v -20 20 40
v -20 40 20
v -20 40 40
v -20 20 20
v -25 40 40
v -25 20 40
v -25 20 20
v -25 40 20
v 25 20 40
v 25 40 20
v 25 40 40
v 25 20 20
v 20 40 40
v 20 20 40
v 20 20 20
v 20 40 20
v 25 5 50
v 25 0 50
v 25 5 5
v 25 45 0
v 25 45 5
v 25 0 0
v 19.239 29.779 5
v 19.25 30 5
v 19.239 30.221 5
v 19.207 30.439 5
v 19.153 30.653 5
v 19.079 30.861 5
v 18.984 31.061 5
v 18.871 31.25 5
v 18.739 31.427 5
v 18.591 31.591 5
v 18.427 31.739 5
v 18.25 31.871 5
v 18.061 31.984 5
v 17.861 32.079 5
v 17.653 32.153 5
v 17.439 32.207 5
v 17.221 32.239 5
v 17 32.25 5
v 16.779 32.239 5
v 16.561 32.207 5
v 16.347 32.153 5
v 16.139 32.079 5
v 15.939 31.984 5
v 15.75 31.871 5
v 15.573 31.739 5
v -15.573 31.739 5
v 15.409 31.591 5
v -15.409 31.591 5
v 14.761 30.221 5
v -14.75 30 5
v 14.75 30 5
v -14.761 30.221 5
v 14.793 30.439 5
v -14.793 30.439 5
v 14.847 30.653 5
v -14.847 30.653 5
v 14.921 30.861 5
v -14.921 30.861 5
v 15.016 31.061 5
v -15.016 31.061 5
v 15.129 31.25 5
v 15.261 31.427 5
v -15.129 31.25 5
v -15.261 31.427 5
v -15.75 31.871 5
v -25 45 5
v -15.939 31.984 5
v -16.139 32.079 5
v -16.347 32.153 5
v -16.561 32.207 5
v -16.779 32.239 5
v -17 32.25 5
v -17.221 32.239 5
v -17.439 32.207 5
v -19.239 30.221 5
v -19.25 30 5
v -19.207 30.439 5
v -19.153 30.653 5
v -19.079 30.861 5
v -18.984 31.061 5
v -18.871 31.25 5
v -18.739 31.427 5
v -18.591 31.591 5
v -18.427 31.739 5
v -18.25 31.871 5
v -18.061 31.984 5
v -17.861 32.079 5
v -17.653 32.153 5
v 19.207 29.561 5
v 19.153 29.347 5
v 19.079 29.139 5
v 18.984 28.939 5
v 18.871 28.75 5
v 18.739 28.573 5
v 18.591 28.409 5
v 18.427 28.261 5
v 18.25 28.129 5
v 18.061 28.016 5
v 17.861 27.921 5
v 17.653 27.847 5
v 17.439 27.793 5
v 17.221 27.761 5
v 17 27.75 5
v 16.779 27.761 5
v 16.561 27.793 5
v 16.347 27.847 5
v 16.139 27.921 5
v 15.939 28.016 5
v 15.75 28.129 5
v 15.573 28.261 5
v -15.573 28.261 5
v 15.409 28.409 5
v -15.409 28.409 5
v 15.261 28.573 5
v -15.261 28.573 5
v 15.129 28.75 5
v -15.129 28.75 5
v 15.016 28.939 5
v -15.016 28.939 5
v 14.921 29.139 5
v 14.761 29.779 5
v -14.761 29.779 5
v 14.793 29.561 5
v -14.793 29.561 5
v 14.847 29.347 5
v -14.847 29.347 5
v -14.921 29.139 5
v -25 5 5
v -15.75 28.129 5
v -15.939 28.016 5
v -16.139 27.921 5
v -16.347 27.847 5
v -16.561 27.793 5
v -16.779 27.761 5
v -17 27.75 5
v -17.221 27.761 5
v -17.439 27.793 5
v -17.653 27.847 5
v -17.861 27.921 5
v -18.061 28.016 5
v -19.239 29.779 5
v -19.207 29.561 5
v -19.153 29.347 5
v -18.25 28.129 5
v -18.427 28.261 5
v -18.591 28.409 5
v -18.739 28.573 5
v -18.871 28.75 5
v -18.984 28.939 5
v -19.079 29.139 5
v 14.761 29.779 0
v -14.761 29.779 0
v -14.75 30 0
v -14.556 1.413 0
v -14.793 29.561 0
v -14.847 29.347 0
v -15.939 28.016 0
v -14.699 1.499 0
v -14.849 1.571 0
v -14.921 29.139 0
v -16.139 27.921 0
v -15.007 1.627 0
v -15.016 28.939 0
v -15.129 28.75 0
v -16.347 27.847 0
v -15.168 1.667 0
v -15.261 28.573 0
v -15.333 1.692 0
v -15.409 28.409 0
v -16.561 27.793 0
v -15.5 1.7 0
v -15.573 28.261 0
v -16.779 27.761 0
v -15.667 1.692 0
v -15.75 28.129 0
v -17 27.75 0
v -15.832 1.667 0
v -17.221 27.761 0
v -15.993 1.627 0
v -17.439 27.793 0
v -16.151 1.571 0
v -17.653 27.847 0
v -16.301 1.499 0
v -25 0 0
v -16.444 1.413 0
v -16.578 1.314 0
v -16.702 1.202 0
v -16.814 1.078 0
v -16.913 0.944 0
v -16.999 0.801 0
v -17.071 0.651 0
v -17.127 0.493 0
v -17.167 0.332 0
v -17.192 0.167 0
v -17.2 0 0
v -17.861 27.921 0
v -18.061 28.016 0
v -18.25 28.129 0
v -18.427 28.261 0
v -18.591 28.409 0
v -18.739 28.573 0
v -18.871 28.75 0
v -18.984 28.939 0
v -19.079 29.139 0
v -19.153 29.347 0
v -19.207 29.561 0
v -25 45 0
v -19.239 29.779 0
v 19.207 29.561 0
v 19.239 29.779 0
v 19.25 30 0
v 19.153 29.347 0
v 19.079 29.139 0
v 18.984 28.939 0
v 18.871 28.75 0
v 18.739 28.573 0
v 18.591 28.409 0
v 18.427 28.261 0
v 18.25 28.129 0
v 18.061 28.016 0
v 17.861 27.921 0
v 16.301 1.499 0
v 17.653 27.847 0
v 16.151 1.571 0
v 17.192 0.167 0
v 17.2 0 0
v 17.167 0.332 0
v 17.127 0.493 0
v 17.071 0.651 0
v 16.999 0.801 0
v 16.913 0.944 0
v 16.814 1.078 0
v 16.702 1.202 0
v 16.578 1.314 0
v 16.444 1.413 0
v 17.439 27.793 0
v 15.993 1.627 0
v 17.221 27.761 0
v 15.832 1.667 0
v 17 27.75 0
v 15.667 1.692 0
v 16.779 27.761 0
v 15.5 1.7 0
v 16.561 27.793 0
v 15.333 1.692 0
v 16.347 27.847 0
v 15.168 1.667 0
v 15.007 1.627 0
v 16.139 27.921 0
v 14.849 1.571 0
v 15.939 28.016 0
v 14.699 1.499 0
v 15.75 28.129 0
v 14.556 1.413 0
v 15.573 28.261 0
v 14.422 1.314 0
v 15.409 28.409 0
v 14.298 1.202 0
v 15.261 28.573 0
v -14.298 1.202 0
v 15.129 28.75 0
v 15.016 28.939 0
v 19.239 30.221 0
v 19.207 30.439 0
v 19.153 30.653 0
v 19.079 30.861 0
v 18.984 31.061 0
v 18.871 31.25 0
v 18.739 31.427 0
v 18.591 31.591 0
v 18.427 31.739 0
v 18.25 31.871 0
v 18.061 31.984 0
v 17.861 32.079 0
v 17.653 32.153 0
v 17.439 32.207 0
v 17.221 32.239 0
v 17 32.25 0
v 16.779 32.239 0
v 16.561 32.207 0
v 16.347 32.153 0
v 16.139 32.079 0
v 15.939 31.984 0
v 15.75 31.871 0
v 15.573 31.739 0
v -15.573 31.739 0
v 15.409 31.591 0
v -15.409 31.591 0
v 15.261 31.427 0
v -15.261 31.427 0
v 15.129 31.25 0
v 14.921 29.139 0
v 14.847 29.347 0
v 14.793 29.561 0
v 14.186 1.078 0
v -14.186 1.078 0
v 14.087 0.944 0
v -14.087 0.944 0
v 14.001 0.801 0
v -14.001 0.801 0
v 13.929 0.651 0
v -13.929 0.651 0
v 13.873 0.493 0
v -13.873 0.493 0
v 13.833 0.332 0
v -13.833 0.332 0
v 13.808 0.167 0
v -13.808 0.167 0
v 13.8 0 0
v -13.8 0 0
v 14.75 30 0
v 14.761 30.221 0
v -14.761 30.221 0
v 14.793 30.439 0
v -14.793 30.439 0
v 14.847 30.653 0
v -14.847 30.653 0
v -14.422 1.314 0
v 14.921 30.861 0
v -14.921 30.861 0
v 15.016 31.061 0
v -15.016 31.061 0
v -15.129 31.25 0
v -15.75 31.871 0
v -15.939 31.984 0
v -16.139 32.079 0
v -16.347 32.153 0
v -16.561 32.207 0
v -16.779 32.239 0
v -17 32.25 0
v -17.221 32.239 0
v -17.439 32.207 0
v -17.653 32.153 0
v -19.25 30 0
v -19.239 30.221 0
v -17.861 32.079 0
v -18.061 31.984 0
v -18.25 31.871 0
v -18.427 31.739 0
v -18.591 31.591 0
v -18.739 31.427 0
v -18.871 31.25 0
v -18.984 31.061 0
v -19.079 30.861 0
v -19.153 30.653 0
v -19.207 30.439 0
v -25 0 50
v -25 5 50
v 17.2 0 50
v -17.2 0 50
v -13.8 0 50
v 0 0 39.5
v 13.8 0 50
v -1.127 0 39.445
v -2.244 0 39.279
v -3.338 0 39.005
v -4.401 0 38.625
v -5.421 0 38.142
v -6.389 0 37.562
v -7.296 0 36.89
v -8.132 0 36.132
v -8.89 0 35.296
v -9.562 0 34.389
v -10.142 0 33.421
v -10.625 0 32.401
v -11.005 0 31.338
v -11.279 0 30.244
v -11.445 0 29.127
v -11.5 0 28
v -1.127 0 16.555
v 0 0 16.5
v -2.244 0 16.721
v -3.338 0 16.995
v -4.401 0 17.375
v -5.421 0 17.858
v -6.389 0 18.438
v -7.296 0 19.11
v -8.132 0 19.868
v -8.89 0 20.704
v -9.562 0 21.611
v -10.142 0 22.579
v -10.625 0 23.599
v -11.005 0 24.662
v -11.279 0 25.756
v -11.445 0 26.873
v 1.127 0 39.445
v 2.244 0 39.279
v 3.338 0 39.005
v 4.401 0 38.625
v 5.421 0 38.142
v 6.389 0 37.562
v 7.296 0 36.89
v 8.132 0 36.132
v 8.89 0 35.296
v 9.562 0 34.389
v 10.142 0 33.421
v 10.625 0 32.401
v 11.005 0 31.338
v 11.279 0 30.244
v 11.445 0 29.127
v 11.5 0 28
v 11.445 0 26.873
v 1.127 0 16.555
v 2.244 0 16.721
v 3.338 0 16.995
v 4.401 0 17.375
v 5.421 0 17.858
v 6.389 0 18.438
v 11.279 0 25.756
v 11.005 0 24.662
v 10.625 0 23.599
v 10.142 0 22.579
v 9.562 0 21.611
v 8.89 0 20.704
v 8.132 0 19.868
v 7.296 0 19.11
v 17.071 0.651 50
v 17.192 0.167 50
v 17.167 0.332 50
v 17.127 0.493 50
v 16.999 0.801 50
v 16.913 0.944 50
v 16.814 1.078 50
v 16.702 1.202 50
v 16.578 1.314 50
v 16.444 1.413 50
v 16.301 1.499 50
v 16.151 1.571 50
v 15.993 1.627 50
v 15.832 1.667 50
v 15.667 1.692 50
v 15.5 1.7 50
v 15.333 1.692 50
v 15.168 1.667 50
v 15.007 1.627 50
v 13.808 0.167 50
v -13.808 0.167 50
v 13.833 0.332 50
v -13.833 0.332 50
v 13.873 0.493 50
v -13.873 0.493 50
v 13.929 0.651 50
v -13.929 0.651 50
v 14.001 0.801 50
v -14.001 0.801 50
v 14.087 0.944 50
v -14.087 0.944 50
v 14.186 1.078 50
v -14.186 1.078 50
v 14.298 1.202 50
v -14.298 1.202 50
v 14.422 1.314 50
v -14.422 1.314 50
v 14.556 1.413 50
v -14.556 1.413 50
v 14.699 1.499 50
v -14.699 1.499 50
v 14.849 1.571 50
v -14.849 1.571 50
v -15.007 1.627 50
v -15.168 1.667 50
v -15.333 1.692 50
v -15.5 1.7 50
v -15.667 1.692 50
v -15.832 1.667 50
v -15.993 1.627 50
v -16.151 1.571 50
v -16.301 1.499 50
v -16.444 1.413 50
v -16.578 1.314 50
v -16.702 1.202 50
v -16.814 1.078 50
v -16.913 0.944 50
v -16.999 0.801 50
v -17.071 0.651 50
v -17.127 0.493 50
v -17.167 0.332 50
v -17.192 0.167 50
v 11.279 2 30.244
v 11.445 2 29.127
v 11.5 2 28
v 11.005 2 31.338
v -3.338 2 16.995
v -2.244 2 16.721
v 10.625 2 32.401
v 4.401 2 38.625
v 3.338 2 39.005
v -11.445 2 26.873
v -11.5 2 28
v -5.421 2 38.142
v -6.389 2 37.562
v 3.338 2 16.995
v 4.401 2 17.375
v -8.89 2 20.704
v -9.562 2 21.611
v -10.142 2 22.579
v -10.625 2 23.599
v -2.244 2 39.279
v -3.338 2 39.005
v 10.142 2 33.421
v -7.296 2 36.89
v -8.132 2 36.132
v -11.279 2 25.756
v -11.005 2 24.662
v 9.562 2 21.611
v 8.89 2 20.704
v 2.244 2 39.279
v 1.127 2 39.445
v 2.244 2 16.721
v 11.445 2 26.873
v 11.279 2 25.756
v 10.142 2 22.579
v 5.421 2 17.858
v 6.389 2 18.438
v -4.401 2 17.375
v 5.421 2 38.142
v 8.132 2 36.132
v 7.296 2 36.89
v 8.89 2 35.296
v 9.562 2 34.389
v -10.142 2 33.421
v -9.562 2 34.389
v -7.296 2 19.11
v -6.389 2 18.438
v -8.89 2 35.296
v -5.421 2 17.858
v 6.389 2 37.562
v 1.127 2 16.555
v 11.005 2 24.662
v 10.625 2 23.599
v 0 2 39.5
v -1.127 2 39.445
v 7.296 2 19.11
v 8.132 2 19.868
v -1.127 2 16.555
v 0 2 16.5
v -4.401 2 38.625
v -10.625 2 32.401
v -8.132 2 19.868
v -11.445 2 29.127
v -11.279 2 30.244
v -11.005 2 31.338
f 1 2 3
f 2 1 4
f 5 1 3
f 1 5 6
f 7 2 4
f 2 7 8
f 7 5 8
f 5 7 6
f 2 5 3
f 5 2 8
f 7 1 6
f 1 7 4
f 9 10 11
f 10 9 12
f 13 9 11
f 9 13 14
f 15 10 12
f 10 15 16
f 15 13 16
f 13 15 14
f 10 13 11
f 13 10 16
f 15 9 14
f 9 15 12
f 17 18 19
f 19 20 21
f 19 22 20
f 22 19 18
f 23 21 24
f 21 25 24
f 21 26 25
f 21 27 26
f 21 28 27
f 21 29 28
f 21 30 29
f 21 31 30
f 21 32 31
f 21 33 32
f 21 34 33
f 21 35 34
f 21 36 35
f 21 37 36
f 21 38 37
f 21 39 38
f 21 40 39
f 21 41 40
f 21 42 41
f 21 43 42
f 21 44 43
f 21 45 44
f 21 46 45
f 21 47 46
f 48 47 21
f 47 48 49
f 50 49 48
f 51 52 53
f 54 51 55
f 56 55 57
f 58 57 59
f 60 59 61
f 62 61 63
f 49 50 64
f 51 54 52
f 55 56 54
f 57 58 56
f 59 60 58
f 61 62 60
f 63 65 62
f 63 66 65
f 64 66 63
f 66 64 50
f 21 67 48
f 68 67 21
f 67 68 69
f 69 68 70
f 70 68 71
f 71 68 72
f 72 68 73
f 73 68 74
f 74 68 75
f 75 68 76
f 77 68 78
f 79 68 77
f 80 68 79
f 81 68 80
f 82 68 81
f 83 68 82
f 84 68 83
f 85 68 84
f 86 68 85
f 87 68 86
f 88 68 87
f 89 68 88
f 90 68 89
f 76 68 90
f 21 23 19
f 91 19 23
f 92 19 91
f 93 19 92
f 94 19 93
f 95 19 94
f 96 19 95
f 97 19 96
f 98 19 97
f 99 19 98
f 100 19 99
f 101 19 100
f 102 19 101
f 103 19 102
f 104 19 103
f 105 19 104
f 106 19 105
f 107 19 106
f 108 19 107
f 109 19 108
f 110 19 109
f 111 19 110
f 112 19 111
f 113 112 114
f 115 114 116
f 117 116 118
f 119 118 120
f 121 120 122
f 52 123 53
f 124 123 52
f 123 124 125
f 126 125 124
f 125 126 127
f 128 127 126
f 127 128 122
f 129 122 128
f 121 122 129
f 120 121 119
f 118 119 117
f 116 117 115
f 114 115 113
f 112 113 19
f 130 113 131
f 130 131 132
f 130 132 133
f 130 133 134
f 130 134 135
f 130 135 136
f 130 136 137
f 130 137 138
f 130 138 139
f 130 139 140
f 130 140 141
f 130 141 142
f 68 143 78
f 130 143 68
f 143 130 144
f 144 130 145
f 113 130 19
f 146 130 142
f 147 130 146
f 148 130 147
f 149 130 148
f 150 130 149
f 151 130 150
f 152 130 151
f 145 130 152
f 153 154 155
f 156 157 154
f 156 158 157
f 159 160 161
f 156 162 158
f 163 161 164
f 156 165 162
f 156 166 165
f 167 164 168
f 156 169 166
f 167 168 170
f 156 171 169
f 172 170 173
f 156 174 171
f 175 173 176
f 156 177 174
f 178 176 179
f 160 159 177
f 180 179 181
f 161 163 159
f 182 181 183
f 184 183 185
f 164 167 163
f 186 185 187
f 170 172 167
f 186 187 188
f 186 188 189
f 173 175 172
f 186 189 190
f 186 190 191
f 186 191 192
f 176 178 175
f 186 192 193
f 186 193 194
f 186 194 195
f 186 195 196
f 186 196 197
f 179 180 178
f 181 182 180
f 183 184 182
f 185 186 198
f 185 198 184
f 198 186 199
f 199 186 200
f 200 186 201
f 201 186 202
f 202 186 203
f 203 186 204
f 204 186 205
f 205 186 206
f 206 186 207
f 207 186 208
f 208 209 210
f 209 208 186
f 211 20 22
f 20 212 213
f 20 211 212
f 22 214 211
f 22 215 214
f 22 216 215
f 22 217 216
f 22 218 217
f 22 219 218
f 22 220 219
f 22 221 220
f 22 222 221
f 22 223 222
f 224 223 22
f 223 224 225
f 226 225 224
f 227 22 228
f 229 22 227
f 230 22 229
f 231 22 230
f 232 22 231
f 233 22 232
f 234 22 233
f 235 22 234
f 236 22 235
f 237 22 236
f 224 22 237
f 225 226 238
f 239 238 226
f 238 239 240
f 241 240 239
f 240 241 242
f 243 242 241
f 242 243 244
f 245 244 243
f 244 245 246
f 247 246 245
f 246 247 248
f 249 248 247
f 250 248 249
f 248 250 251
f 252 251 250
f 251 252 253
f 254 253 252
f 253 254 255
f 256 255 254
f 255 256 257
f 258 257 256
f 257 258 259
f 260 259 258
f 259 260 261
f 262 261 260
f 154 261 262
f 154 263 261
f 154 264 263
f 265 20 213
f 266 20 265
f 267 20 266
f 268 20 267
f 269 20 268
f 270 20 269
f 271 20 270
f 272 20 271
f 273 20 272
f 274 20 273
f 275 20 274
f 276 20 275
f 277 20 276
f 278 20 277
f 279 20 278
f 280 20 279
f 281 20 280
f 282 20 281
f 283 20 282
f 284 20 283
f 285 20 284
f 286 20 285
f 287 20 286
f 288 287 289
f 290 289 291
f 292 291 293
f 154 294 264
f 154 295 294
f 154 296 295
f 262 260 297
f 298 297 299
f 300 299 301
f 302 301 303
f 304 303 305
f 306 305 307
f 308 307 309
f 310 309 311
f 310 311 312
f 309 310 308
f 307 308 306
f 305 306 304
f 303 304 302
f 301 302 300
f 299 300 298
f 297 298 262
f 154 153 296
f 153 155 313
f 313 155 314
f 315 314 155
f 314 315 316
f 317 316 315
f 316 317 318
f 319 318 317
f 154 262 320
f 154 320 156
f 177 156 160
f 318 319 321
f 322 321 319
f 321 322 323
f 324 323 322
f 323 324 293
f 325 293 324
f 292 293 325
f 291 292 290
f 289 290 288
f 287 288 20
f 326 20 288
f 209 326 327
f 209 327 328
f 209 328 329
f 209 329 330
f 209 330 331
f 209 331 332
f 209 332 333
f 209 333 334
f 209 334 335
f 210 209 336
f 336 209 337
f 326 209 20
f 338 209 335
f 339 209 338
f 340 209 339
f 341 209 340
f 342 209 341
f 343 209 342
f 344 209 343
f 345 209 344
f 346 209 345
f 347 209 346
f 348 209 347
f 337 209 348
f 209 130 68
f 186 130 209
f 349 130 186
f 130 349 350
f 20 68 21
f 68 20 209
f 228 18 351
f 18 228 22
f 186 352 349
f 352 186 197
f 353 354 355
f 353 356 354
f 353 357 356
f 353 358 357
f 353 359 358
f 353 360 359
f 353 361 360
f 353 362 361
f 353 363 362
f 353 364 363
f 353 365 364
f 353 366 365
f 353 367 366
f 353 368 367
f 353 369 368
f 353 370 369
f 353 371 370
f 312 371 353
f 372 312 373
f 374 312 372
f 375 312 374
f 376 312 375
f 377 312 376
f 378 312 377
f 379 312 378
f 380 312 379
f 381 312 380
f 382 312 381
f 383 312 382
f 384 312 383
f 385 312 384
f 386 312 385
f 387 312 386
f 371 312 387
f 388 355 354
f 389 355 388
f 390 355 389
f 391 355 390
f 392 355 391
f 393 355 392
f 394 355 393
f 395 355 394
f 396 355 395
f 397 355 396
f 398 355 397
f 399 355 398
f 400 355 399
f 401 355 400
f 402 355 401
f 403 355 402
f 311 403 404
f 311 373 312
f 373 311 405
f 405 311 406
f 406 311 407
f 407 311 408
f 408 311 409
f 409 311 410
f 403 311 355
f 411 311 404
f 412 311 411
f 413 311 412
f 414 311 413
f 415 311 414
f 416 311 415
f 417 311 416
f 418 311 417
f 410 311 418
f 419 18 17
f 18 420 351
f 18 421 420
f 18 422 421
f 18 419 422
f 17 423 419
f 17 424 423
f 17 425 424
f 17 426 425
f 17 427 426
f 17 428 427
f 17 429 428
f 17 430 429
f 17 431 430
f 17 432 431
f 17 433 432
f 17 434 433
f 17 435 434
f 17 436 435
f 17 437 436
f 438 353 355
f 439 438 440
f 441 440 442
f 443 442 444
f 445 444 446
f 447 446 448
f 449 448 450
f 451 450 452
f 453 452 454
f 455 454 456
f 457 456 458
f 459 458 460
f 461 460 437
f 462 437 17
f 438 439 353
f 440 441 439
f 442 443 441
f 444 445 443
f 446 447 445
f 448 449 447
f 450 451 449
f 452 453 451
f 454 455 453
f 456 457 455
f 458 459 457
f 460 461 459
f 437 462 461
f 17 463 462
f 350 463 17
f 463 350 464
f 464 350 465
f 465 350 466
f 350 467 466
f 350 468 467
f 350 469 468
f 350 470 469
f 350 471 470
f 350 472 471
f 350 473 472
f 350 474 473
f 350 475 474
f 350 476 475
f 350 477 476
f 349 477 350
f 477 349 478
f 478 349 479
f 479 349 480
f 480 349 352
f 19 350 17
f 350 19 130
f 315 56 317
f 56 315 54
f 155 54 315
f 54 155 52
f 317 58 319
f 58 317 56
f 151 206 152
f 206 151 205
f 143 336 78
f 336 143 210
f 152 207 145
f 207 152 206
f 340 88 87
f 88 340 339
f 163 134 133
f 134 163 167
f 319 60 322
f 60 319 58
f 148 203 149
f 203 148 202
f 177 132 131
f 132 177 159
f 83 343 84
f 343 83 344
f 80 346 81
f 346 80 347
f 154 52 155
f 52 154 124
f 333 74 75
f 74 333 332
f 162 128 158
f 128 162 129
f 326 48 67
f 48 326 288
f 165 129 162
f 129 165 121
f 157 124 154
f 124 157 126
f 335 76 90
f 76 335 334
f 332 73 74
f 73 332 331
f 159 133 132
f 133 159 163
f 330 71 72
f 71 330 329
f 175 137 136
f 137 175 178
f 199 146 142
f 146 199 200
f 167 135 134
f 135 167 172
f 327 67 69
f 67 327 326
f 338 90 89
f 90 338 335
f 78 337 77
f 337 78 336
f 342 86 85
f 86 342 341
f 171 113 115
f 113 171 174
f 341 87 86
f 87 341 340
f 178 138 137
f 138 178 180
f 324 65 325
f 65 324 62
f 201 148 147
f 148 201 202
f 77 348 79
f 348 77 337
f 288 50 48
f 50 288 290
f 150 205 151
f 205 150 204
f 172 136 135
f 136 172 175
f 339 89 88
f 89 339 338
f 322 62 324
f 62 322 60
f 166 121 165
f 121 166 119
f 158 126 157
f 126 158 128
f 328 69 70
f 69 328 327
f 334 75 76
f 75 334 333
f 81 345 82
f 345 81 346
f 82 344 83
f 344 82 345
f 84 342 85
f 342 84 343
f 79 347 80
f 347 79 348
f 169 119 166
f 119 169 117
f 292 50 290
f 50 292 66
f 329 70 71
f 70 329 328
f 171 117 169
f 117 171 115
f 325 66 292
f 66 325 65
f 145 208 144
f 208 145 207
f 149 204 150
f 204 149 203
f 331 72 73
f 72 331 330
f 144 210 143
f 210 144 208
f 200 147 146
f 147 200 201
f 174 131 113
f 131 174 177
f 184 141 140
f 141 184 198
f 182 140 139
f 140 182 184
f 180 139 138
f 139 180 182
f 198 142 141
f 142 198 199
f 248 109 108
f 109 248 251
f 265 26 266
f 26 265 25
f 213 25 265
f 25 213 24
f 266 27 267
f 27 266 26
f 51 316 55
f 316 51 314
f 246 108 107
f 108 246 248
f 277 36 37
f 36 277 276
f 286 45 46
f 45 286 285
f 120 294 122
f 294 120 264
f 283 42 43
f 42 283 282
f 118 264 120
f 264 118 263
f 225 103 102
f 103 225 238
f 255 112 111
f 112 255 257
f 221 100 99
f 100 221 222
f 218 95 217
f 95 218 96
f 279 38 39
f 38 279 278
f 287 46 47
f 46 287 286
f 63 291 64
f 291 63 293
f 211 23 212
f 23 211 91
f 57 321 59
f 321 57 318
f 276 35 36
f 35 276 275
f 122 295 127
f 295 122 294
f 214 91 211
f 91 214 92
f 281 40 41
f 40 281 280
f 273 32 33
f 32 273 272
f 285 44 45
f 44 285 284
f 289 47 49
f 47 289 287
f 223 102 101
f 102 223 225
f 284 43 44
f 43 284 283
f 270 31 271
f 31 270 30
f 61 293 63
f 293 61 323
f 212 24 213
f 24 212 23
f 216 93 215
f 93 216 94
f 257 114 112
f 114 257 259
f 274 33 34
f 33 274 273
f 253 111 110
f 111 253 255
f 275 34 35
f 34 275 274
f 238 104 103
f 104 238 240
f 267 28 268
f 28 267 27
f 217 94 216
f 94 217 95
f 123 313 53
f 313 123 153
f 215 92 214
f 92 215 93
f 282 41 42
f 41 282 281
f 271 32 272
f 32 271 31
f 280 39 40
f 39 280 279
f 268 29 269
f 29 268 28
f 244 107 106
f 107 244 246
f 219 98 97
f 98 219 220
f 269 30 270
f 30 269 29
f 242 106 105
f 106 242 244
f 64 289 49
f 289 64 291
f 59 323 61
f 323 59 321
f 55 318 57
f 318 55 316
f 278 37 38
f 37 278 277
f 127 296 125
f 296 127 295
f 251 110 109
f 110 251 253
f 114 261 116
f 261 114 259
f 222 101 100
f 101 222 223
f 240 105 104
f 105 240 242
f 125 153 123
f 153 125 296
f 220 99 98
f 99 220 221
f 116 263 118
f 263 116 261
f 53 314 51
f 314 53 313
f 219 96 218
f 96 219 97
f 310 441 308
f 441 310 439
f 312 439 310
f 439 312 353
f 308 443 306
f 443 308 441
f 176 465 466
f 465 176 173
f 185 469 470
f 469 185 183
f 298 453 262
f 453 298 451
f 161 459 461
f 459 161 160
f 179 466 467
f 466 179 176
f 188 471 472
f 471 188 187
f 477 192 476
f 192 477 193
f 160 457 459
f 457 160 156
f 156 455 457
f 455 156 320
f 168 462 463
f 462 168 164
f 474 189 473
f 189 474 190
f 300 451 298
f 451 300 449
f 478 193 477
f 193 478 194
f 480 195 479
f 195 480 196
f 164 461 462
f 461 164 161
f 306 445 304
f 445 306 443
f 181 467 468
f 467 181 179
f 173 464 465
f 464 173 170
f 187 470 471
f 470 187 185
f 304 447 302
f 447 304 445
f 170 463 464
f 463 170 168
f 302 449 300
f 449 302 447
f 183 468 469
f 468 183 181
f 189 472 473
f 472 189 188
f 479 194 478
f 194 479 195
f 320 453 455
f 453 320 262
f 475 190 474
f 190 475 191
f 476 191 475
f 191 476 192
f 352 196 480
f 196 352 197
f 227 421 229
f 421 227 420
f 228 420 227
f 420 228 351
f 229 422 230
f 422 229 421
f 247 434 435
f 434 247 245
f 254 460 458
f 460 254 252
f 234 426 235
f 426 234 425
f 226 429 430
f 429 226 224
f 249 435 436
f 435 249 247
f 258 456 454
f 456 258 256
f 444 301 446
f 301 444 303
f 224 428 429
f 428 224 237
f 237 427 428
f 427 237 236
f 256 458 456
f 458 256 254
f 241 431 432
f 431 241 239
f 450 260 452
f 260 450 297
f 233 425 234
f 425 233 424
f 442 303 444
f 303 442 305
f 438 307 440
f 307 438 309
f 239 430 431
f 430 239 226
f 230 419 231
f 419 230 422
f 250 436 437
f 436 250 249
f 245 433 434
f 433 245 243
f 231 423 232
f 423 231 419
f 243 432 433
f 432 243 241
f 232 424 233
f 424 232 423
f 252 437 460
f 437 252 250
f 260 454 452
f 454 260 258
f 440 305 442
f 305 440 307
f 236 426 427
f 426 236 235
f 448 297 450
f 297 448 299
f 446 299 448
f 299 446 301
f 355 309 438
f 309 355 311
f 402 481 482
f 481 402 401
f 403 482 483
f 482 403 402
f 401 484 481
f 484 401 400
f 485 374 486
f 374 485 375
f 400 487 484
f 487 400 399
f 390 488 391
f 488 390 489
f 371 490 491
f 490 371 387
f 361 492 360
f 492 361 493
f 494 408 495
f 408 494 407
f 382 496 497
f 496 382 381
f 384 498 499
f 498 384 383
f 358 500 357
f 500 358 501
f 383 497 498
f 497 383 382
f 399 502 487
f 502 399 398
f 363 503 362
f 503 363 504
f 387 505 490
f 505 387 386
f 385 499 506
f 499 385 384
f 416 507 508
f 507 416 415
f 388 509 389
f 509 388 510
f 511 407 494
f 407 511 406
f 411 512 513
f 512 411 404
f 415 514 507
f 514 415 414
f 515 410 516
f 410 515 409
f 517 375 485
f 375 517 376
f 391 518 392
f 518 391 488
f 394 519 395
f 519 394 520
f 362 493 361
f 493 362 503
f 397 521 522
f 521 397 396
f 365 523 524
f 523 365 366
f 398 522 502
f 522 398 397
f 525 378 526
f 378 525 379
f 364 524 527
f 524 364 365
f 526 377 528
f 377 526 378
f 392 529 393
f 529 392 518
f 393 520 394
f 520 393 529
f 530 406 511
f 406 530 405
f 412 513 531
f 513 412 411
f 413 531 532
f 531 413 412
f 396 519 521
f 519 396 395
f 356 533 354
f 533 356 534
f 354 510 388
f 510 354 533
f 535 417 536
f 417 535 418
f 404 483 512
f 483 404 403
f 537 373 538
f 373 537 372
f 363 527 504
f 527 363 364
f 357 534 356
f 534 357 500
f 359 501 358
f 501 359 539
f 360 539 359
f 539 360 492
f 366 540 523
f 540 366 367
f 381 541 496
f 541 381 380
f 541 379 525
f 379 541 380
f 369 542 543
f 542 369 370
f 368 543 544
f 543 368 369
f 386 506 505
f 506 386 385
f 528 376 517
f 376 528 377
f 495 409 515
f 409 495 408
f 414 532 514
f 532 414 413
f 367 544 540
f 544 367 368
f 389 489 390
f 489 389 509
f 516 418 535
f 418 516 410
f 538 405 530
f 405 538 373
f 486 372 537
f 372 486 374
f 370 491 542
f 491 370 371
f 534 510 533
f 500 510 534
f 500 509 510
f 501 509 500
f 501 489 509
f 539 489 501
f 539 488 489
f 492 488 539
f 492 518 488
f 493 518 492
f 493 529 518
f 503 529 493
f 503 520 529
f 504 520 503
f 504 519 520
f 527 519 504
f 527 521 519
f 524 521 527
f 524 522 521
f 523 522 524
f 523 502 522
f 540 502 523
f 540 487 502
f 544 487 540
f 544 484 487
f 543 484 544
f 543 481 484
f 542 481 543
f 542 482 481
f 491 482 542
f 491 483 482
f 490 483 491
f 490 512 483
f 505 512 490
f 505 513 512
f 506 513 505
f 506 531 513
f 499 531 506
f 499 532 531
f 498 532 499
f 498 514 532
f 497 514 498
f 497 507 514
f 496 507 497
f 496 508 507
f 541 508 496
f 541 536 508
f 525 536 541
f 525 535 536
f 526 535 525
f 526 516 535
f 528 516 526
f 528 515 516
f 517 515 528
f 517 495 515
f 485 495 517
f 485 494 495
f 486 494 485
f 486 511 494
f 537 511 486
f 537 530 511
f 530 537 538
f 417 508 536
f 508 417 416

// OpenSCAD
// L-shaped mounting bracket for NEMA 17 stepper motor (syringe pump)
// Print orientation: base plate on bed (z = 0), motor plate builds upward.

// ---------------- Parameters ----------------
base_x0      = -25;   // base plate x start
base_x1      = 25;    // base plate x end
base_y0      = 0;     // base plate y start
base_y1      = 45;    // base plate y end
base_z       = 5;     // base plate thickness

motor_x0     = -25;   // motor plate x start
motor_x1     = 25;    // motor plate x end
motor_y0     = 0;     // motor plate y start
motor_y1     = 5;     // motor plate y end (top)
motor_z      = 50;    // motor plate height

hole_m4_x    = -17;   // M4 hole x position (left)
hole_m4_y    = 30;    // M4 hole y position
hole_m4_d    = 4.5;   // M4 hole diameter

hole_m4_x2   = 17;    // M4 hole x position (right)

boss_d       = 23;    // motor centring boss hole diameter
boss_x       = 0;     // boss hole x centre
boss_z       = 28;    // boss hole z centre

screw_d      = 3.4;   // M3 screw hole diameter
screw_pitch  = 31;    // square pattern side length
screw_count  = 4;     // number of screw holes

gusset_t     = 5;     // gusset thickness (X)
gusset_leg   = 20;    // right triangle leg length (Y and Z)
gusset_x0    = -25;   // left gusset x start
gusset_x1    = -20;   // left gusset x end
gusset_x2    = 20;    // right gusset x start
gusset_x3    = 25;    // right gusset x end

eps          = 0.5;   // cutter overshoot past faces

$fn = 64;

// ---------------- Model ----------------
difference() {
    union() {
        // Base plate
        translate([base_x0, base_y0, 0])
            cube([base_x1 - base_x0, base_y1 - base_y0, base_z]);

        // Motor plate, standing on back edge of base
        translate([motor_x0, motor_y0, 0])
            cube([motor_x1 - motor_x0, motor_y1 - motor_y0, motor_z]);

        // Gussets, flush with left and right edges
        for (sx = [-1, 1])
            translate([sx > 0 ? gusset_x2 : gusset_x0,
                       gusset_leg,
                       gusset_leg])
                cube([gusset_t,
                      gusset_leg,
                      gusset_leg]);
    }

    // Vertical M4 through-holes in base
    for (hx = [hole_m4_x, hole_m4_x2])
        translate([hx, hole_m4_y, -eps])
            cylinder(d = hole_m4_d, h = base_z + 2 * eps);

    // Motor boss hole through motor plate (along Y)
    translate([boss_x, 0, boss_z])
        rotate([90, 0, 0])
            cylinder(d = boss_d, h = motor_y1 - motor_y0 - 2 * eps, center = true);

    // M3 screw holes on square pattern, centred on boss hole
    for (i = [0 : screw_count - 1]) {
        x = (i % 2 == 0) ? -screw_pitch / 2 : screw_pitch / 2;
        z = (i < 2) ? -screw_pitch / 2 : screw_pitch / 2;
        translate([x, 0, z])
            cylinder(d = screw_d, h = motor_z + 2 * eps);
    }
}
